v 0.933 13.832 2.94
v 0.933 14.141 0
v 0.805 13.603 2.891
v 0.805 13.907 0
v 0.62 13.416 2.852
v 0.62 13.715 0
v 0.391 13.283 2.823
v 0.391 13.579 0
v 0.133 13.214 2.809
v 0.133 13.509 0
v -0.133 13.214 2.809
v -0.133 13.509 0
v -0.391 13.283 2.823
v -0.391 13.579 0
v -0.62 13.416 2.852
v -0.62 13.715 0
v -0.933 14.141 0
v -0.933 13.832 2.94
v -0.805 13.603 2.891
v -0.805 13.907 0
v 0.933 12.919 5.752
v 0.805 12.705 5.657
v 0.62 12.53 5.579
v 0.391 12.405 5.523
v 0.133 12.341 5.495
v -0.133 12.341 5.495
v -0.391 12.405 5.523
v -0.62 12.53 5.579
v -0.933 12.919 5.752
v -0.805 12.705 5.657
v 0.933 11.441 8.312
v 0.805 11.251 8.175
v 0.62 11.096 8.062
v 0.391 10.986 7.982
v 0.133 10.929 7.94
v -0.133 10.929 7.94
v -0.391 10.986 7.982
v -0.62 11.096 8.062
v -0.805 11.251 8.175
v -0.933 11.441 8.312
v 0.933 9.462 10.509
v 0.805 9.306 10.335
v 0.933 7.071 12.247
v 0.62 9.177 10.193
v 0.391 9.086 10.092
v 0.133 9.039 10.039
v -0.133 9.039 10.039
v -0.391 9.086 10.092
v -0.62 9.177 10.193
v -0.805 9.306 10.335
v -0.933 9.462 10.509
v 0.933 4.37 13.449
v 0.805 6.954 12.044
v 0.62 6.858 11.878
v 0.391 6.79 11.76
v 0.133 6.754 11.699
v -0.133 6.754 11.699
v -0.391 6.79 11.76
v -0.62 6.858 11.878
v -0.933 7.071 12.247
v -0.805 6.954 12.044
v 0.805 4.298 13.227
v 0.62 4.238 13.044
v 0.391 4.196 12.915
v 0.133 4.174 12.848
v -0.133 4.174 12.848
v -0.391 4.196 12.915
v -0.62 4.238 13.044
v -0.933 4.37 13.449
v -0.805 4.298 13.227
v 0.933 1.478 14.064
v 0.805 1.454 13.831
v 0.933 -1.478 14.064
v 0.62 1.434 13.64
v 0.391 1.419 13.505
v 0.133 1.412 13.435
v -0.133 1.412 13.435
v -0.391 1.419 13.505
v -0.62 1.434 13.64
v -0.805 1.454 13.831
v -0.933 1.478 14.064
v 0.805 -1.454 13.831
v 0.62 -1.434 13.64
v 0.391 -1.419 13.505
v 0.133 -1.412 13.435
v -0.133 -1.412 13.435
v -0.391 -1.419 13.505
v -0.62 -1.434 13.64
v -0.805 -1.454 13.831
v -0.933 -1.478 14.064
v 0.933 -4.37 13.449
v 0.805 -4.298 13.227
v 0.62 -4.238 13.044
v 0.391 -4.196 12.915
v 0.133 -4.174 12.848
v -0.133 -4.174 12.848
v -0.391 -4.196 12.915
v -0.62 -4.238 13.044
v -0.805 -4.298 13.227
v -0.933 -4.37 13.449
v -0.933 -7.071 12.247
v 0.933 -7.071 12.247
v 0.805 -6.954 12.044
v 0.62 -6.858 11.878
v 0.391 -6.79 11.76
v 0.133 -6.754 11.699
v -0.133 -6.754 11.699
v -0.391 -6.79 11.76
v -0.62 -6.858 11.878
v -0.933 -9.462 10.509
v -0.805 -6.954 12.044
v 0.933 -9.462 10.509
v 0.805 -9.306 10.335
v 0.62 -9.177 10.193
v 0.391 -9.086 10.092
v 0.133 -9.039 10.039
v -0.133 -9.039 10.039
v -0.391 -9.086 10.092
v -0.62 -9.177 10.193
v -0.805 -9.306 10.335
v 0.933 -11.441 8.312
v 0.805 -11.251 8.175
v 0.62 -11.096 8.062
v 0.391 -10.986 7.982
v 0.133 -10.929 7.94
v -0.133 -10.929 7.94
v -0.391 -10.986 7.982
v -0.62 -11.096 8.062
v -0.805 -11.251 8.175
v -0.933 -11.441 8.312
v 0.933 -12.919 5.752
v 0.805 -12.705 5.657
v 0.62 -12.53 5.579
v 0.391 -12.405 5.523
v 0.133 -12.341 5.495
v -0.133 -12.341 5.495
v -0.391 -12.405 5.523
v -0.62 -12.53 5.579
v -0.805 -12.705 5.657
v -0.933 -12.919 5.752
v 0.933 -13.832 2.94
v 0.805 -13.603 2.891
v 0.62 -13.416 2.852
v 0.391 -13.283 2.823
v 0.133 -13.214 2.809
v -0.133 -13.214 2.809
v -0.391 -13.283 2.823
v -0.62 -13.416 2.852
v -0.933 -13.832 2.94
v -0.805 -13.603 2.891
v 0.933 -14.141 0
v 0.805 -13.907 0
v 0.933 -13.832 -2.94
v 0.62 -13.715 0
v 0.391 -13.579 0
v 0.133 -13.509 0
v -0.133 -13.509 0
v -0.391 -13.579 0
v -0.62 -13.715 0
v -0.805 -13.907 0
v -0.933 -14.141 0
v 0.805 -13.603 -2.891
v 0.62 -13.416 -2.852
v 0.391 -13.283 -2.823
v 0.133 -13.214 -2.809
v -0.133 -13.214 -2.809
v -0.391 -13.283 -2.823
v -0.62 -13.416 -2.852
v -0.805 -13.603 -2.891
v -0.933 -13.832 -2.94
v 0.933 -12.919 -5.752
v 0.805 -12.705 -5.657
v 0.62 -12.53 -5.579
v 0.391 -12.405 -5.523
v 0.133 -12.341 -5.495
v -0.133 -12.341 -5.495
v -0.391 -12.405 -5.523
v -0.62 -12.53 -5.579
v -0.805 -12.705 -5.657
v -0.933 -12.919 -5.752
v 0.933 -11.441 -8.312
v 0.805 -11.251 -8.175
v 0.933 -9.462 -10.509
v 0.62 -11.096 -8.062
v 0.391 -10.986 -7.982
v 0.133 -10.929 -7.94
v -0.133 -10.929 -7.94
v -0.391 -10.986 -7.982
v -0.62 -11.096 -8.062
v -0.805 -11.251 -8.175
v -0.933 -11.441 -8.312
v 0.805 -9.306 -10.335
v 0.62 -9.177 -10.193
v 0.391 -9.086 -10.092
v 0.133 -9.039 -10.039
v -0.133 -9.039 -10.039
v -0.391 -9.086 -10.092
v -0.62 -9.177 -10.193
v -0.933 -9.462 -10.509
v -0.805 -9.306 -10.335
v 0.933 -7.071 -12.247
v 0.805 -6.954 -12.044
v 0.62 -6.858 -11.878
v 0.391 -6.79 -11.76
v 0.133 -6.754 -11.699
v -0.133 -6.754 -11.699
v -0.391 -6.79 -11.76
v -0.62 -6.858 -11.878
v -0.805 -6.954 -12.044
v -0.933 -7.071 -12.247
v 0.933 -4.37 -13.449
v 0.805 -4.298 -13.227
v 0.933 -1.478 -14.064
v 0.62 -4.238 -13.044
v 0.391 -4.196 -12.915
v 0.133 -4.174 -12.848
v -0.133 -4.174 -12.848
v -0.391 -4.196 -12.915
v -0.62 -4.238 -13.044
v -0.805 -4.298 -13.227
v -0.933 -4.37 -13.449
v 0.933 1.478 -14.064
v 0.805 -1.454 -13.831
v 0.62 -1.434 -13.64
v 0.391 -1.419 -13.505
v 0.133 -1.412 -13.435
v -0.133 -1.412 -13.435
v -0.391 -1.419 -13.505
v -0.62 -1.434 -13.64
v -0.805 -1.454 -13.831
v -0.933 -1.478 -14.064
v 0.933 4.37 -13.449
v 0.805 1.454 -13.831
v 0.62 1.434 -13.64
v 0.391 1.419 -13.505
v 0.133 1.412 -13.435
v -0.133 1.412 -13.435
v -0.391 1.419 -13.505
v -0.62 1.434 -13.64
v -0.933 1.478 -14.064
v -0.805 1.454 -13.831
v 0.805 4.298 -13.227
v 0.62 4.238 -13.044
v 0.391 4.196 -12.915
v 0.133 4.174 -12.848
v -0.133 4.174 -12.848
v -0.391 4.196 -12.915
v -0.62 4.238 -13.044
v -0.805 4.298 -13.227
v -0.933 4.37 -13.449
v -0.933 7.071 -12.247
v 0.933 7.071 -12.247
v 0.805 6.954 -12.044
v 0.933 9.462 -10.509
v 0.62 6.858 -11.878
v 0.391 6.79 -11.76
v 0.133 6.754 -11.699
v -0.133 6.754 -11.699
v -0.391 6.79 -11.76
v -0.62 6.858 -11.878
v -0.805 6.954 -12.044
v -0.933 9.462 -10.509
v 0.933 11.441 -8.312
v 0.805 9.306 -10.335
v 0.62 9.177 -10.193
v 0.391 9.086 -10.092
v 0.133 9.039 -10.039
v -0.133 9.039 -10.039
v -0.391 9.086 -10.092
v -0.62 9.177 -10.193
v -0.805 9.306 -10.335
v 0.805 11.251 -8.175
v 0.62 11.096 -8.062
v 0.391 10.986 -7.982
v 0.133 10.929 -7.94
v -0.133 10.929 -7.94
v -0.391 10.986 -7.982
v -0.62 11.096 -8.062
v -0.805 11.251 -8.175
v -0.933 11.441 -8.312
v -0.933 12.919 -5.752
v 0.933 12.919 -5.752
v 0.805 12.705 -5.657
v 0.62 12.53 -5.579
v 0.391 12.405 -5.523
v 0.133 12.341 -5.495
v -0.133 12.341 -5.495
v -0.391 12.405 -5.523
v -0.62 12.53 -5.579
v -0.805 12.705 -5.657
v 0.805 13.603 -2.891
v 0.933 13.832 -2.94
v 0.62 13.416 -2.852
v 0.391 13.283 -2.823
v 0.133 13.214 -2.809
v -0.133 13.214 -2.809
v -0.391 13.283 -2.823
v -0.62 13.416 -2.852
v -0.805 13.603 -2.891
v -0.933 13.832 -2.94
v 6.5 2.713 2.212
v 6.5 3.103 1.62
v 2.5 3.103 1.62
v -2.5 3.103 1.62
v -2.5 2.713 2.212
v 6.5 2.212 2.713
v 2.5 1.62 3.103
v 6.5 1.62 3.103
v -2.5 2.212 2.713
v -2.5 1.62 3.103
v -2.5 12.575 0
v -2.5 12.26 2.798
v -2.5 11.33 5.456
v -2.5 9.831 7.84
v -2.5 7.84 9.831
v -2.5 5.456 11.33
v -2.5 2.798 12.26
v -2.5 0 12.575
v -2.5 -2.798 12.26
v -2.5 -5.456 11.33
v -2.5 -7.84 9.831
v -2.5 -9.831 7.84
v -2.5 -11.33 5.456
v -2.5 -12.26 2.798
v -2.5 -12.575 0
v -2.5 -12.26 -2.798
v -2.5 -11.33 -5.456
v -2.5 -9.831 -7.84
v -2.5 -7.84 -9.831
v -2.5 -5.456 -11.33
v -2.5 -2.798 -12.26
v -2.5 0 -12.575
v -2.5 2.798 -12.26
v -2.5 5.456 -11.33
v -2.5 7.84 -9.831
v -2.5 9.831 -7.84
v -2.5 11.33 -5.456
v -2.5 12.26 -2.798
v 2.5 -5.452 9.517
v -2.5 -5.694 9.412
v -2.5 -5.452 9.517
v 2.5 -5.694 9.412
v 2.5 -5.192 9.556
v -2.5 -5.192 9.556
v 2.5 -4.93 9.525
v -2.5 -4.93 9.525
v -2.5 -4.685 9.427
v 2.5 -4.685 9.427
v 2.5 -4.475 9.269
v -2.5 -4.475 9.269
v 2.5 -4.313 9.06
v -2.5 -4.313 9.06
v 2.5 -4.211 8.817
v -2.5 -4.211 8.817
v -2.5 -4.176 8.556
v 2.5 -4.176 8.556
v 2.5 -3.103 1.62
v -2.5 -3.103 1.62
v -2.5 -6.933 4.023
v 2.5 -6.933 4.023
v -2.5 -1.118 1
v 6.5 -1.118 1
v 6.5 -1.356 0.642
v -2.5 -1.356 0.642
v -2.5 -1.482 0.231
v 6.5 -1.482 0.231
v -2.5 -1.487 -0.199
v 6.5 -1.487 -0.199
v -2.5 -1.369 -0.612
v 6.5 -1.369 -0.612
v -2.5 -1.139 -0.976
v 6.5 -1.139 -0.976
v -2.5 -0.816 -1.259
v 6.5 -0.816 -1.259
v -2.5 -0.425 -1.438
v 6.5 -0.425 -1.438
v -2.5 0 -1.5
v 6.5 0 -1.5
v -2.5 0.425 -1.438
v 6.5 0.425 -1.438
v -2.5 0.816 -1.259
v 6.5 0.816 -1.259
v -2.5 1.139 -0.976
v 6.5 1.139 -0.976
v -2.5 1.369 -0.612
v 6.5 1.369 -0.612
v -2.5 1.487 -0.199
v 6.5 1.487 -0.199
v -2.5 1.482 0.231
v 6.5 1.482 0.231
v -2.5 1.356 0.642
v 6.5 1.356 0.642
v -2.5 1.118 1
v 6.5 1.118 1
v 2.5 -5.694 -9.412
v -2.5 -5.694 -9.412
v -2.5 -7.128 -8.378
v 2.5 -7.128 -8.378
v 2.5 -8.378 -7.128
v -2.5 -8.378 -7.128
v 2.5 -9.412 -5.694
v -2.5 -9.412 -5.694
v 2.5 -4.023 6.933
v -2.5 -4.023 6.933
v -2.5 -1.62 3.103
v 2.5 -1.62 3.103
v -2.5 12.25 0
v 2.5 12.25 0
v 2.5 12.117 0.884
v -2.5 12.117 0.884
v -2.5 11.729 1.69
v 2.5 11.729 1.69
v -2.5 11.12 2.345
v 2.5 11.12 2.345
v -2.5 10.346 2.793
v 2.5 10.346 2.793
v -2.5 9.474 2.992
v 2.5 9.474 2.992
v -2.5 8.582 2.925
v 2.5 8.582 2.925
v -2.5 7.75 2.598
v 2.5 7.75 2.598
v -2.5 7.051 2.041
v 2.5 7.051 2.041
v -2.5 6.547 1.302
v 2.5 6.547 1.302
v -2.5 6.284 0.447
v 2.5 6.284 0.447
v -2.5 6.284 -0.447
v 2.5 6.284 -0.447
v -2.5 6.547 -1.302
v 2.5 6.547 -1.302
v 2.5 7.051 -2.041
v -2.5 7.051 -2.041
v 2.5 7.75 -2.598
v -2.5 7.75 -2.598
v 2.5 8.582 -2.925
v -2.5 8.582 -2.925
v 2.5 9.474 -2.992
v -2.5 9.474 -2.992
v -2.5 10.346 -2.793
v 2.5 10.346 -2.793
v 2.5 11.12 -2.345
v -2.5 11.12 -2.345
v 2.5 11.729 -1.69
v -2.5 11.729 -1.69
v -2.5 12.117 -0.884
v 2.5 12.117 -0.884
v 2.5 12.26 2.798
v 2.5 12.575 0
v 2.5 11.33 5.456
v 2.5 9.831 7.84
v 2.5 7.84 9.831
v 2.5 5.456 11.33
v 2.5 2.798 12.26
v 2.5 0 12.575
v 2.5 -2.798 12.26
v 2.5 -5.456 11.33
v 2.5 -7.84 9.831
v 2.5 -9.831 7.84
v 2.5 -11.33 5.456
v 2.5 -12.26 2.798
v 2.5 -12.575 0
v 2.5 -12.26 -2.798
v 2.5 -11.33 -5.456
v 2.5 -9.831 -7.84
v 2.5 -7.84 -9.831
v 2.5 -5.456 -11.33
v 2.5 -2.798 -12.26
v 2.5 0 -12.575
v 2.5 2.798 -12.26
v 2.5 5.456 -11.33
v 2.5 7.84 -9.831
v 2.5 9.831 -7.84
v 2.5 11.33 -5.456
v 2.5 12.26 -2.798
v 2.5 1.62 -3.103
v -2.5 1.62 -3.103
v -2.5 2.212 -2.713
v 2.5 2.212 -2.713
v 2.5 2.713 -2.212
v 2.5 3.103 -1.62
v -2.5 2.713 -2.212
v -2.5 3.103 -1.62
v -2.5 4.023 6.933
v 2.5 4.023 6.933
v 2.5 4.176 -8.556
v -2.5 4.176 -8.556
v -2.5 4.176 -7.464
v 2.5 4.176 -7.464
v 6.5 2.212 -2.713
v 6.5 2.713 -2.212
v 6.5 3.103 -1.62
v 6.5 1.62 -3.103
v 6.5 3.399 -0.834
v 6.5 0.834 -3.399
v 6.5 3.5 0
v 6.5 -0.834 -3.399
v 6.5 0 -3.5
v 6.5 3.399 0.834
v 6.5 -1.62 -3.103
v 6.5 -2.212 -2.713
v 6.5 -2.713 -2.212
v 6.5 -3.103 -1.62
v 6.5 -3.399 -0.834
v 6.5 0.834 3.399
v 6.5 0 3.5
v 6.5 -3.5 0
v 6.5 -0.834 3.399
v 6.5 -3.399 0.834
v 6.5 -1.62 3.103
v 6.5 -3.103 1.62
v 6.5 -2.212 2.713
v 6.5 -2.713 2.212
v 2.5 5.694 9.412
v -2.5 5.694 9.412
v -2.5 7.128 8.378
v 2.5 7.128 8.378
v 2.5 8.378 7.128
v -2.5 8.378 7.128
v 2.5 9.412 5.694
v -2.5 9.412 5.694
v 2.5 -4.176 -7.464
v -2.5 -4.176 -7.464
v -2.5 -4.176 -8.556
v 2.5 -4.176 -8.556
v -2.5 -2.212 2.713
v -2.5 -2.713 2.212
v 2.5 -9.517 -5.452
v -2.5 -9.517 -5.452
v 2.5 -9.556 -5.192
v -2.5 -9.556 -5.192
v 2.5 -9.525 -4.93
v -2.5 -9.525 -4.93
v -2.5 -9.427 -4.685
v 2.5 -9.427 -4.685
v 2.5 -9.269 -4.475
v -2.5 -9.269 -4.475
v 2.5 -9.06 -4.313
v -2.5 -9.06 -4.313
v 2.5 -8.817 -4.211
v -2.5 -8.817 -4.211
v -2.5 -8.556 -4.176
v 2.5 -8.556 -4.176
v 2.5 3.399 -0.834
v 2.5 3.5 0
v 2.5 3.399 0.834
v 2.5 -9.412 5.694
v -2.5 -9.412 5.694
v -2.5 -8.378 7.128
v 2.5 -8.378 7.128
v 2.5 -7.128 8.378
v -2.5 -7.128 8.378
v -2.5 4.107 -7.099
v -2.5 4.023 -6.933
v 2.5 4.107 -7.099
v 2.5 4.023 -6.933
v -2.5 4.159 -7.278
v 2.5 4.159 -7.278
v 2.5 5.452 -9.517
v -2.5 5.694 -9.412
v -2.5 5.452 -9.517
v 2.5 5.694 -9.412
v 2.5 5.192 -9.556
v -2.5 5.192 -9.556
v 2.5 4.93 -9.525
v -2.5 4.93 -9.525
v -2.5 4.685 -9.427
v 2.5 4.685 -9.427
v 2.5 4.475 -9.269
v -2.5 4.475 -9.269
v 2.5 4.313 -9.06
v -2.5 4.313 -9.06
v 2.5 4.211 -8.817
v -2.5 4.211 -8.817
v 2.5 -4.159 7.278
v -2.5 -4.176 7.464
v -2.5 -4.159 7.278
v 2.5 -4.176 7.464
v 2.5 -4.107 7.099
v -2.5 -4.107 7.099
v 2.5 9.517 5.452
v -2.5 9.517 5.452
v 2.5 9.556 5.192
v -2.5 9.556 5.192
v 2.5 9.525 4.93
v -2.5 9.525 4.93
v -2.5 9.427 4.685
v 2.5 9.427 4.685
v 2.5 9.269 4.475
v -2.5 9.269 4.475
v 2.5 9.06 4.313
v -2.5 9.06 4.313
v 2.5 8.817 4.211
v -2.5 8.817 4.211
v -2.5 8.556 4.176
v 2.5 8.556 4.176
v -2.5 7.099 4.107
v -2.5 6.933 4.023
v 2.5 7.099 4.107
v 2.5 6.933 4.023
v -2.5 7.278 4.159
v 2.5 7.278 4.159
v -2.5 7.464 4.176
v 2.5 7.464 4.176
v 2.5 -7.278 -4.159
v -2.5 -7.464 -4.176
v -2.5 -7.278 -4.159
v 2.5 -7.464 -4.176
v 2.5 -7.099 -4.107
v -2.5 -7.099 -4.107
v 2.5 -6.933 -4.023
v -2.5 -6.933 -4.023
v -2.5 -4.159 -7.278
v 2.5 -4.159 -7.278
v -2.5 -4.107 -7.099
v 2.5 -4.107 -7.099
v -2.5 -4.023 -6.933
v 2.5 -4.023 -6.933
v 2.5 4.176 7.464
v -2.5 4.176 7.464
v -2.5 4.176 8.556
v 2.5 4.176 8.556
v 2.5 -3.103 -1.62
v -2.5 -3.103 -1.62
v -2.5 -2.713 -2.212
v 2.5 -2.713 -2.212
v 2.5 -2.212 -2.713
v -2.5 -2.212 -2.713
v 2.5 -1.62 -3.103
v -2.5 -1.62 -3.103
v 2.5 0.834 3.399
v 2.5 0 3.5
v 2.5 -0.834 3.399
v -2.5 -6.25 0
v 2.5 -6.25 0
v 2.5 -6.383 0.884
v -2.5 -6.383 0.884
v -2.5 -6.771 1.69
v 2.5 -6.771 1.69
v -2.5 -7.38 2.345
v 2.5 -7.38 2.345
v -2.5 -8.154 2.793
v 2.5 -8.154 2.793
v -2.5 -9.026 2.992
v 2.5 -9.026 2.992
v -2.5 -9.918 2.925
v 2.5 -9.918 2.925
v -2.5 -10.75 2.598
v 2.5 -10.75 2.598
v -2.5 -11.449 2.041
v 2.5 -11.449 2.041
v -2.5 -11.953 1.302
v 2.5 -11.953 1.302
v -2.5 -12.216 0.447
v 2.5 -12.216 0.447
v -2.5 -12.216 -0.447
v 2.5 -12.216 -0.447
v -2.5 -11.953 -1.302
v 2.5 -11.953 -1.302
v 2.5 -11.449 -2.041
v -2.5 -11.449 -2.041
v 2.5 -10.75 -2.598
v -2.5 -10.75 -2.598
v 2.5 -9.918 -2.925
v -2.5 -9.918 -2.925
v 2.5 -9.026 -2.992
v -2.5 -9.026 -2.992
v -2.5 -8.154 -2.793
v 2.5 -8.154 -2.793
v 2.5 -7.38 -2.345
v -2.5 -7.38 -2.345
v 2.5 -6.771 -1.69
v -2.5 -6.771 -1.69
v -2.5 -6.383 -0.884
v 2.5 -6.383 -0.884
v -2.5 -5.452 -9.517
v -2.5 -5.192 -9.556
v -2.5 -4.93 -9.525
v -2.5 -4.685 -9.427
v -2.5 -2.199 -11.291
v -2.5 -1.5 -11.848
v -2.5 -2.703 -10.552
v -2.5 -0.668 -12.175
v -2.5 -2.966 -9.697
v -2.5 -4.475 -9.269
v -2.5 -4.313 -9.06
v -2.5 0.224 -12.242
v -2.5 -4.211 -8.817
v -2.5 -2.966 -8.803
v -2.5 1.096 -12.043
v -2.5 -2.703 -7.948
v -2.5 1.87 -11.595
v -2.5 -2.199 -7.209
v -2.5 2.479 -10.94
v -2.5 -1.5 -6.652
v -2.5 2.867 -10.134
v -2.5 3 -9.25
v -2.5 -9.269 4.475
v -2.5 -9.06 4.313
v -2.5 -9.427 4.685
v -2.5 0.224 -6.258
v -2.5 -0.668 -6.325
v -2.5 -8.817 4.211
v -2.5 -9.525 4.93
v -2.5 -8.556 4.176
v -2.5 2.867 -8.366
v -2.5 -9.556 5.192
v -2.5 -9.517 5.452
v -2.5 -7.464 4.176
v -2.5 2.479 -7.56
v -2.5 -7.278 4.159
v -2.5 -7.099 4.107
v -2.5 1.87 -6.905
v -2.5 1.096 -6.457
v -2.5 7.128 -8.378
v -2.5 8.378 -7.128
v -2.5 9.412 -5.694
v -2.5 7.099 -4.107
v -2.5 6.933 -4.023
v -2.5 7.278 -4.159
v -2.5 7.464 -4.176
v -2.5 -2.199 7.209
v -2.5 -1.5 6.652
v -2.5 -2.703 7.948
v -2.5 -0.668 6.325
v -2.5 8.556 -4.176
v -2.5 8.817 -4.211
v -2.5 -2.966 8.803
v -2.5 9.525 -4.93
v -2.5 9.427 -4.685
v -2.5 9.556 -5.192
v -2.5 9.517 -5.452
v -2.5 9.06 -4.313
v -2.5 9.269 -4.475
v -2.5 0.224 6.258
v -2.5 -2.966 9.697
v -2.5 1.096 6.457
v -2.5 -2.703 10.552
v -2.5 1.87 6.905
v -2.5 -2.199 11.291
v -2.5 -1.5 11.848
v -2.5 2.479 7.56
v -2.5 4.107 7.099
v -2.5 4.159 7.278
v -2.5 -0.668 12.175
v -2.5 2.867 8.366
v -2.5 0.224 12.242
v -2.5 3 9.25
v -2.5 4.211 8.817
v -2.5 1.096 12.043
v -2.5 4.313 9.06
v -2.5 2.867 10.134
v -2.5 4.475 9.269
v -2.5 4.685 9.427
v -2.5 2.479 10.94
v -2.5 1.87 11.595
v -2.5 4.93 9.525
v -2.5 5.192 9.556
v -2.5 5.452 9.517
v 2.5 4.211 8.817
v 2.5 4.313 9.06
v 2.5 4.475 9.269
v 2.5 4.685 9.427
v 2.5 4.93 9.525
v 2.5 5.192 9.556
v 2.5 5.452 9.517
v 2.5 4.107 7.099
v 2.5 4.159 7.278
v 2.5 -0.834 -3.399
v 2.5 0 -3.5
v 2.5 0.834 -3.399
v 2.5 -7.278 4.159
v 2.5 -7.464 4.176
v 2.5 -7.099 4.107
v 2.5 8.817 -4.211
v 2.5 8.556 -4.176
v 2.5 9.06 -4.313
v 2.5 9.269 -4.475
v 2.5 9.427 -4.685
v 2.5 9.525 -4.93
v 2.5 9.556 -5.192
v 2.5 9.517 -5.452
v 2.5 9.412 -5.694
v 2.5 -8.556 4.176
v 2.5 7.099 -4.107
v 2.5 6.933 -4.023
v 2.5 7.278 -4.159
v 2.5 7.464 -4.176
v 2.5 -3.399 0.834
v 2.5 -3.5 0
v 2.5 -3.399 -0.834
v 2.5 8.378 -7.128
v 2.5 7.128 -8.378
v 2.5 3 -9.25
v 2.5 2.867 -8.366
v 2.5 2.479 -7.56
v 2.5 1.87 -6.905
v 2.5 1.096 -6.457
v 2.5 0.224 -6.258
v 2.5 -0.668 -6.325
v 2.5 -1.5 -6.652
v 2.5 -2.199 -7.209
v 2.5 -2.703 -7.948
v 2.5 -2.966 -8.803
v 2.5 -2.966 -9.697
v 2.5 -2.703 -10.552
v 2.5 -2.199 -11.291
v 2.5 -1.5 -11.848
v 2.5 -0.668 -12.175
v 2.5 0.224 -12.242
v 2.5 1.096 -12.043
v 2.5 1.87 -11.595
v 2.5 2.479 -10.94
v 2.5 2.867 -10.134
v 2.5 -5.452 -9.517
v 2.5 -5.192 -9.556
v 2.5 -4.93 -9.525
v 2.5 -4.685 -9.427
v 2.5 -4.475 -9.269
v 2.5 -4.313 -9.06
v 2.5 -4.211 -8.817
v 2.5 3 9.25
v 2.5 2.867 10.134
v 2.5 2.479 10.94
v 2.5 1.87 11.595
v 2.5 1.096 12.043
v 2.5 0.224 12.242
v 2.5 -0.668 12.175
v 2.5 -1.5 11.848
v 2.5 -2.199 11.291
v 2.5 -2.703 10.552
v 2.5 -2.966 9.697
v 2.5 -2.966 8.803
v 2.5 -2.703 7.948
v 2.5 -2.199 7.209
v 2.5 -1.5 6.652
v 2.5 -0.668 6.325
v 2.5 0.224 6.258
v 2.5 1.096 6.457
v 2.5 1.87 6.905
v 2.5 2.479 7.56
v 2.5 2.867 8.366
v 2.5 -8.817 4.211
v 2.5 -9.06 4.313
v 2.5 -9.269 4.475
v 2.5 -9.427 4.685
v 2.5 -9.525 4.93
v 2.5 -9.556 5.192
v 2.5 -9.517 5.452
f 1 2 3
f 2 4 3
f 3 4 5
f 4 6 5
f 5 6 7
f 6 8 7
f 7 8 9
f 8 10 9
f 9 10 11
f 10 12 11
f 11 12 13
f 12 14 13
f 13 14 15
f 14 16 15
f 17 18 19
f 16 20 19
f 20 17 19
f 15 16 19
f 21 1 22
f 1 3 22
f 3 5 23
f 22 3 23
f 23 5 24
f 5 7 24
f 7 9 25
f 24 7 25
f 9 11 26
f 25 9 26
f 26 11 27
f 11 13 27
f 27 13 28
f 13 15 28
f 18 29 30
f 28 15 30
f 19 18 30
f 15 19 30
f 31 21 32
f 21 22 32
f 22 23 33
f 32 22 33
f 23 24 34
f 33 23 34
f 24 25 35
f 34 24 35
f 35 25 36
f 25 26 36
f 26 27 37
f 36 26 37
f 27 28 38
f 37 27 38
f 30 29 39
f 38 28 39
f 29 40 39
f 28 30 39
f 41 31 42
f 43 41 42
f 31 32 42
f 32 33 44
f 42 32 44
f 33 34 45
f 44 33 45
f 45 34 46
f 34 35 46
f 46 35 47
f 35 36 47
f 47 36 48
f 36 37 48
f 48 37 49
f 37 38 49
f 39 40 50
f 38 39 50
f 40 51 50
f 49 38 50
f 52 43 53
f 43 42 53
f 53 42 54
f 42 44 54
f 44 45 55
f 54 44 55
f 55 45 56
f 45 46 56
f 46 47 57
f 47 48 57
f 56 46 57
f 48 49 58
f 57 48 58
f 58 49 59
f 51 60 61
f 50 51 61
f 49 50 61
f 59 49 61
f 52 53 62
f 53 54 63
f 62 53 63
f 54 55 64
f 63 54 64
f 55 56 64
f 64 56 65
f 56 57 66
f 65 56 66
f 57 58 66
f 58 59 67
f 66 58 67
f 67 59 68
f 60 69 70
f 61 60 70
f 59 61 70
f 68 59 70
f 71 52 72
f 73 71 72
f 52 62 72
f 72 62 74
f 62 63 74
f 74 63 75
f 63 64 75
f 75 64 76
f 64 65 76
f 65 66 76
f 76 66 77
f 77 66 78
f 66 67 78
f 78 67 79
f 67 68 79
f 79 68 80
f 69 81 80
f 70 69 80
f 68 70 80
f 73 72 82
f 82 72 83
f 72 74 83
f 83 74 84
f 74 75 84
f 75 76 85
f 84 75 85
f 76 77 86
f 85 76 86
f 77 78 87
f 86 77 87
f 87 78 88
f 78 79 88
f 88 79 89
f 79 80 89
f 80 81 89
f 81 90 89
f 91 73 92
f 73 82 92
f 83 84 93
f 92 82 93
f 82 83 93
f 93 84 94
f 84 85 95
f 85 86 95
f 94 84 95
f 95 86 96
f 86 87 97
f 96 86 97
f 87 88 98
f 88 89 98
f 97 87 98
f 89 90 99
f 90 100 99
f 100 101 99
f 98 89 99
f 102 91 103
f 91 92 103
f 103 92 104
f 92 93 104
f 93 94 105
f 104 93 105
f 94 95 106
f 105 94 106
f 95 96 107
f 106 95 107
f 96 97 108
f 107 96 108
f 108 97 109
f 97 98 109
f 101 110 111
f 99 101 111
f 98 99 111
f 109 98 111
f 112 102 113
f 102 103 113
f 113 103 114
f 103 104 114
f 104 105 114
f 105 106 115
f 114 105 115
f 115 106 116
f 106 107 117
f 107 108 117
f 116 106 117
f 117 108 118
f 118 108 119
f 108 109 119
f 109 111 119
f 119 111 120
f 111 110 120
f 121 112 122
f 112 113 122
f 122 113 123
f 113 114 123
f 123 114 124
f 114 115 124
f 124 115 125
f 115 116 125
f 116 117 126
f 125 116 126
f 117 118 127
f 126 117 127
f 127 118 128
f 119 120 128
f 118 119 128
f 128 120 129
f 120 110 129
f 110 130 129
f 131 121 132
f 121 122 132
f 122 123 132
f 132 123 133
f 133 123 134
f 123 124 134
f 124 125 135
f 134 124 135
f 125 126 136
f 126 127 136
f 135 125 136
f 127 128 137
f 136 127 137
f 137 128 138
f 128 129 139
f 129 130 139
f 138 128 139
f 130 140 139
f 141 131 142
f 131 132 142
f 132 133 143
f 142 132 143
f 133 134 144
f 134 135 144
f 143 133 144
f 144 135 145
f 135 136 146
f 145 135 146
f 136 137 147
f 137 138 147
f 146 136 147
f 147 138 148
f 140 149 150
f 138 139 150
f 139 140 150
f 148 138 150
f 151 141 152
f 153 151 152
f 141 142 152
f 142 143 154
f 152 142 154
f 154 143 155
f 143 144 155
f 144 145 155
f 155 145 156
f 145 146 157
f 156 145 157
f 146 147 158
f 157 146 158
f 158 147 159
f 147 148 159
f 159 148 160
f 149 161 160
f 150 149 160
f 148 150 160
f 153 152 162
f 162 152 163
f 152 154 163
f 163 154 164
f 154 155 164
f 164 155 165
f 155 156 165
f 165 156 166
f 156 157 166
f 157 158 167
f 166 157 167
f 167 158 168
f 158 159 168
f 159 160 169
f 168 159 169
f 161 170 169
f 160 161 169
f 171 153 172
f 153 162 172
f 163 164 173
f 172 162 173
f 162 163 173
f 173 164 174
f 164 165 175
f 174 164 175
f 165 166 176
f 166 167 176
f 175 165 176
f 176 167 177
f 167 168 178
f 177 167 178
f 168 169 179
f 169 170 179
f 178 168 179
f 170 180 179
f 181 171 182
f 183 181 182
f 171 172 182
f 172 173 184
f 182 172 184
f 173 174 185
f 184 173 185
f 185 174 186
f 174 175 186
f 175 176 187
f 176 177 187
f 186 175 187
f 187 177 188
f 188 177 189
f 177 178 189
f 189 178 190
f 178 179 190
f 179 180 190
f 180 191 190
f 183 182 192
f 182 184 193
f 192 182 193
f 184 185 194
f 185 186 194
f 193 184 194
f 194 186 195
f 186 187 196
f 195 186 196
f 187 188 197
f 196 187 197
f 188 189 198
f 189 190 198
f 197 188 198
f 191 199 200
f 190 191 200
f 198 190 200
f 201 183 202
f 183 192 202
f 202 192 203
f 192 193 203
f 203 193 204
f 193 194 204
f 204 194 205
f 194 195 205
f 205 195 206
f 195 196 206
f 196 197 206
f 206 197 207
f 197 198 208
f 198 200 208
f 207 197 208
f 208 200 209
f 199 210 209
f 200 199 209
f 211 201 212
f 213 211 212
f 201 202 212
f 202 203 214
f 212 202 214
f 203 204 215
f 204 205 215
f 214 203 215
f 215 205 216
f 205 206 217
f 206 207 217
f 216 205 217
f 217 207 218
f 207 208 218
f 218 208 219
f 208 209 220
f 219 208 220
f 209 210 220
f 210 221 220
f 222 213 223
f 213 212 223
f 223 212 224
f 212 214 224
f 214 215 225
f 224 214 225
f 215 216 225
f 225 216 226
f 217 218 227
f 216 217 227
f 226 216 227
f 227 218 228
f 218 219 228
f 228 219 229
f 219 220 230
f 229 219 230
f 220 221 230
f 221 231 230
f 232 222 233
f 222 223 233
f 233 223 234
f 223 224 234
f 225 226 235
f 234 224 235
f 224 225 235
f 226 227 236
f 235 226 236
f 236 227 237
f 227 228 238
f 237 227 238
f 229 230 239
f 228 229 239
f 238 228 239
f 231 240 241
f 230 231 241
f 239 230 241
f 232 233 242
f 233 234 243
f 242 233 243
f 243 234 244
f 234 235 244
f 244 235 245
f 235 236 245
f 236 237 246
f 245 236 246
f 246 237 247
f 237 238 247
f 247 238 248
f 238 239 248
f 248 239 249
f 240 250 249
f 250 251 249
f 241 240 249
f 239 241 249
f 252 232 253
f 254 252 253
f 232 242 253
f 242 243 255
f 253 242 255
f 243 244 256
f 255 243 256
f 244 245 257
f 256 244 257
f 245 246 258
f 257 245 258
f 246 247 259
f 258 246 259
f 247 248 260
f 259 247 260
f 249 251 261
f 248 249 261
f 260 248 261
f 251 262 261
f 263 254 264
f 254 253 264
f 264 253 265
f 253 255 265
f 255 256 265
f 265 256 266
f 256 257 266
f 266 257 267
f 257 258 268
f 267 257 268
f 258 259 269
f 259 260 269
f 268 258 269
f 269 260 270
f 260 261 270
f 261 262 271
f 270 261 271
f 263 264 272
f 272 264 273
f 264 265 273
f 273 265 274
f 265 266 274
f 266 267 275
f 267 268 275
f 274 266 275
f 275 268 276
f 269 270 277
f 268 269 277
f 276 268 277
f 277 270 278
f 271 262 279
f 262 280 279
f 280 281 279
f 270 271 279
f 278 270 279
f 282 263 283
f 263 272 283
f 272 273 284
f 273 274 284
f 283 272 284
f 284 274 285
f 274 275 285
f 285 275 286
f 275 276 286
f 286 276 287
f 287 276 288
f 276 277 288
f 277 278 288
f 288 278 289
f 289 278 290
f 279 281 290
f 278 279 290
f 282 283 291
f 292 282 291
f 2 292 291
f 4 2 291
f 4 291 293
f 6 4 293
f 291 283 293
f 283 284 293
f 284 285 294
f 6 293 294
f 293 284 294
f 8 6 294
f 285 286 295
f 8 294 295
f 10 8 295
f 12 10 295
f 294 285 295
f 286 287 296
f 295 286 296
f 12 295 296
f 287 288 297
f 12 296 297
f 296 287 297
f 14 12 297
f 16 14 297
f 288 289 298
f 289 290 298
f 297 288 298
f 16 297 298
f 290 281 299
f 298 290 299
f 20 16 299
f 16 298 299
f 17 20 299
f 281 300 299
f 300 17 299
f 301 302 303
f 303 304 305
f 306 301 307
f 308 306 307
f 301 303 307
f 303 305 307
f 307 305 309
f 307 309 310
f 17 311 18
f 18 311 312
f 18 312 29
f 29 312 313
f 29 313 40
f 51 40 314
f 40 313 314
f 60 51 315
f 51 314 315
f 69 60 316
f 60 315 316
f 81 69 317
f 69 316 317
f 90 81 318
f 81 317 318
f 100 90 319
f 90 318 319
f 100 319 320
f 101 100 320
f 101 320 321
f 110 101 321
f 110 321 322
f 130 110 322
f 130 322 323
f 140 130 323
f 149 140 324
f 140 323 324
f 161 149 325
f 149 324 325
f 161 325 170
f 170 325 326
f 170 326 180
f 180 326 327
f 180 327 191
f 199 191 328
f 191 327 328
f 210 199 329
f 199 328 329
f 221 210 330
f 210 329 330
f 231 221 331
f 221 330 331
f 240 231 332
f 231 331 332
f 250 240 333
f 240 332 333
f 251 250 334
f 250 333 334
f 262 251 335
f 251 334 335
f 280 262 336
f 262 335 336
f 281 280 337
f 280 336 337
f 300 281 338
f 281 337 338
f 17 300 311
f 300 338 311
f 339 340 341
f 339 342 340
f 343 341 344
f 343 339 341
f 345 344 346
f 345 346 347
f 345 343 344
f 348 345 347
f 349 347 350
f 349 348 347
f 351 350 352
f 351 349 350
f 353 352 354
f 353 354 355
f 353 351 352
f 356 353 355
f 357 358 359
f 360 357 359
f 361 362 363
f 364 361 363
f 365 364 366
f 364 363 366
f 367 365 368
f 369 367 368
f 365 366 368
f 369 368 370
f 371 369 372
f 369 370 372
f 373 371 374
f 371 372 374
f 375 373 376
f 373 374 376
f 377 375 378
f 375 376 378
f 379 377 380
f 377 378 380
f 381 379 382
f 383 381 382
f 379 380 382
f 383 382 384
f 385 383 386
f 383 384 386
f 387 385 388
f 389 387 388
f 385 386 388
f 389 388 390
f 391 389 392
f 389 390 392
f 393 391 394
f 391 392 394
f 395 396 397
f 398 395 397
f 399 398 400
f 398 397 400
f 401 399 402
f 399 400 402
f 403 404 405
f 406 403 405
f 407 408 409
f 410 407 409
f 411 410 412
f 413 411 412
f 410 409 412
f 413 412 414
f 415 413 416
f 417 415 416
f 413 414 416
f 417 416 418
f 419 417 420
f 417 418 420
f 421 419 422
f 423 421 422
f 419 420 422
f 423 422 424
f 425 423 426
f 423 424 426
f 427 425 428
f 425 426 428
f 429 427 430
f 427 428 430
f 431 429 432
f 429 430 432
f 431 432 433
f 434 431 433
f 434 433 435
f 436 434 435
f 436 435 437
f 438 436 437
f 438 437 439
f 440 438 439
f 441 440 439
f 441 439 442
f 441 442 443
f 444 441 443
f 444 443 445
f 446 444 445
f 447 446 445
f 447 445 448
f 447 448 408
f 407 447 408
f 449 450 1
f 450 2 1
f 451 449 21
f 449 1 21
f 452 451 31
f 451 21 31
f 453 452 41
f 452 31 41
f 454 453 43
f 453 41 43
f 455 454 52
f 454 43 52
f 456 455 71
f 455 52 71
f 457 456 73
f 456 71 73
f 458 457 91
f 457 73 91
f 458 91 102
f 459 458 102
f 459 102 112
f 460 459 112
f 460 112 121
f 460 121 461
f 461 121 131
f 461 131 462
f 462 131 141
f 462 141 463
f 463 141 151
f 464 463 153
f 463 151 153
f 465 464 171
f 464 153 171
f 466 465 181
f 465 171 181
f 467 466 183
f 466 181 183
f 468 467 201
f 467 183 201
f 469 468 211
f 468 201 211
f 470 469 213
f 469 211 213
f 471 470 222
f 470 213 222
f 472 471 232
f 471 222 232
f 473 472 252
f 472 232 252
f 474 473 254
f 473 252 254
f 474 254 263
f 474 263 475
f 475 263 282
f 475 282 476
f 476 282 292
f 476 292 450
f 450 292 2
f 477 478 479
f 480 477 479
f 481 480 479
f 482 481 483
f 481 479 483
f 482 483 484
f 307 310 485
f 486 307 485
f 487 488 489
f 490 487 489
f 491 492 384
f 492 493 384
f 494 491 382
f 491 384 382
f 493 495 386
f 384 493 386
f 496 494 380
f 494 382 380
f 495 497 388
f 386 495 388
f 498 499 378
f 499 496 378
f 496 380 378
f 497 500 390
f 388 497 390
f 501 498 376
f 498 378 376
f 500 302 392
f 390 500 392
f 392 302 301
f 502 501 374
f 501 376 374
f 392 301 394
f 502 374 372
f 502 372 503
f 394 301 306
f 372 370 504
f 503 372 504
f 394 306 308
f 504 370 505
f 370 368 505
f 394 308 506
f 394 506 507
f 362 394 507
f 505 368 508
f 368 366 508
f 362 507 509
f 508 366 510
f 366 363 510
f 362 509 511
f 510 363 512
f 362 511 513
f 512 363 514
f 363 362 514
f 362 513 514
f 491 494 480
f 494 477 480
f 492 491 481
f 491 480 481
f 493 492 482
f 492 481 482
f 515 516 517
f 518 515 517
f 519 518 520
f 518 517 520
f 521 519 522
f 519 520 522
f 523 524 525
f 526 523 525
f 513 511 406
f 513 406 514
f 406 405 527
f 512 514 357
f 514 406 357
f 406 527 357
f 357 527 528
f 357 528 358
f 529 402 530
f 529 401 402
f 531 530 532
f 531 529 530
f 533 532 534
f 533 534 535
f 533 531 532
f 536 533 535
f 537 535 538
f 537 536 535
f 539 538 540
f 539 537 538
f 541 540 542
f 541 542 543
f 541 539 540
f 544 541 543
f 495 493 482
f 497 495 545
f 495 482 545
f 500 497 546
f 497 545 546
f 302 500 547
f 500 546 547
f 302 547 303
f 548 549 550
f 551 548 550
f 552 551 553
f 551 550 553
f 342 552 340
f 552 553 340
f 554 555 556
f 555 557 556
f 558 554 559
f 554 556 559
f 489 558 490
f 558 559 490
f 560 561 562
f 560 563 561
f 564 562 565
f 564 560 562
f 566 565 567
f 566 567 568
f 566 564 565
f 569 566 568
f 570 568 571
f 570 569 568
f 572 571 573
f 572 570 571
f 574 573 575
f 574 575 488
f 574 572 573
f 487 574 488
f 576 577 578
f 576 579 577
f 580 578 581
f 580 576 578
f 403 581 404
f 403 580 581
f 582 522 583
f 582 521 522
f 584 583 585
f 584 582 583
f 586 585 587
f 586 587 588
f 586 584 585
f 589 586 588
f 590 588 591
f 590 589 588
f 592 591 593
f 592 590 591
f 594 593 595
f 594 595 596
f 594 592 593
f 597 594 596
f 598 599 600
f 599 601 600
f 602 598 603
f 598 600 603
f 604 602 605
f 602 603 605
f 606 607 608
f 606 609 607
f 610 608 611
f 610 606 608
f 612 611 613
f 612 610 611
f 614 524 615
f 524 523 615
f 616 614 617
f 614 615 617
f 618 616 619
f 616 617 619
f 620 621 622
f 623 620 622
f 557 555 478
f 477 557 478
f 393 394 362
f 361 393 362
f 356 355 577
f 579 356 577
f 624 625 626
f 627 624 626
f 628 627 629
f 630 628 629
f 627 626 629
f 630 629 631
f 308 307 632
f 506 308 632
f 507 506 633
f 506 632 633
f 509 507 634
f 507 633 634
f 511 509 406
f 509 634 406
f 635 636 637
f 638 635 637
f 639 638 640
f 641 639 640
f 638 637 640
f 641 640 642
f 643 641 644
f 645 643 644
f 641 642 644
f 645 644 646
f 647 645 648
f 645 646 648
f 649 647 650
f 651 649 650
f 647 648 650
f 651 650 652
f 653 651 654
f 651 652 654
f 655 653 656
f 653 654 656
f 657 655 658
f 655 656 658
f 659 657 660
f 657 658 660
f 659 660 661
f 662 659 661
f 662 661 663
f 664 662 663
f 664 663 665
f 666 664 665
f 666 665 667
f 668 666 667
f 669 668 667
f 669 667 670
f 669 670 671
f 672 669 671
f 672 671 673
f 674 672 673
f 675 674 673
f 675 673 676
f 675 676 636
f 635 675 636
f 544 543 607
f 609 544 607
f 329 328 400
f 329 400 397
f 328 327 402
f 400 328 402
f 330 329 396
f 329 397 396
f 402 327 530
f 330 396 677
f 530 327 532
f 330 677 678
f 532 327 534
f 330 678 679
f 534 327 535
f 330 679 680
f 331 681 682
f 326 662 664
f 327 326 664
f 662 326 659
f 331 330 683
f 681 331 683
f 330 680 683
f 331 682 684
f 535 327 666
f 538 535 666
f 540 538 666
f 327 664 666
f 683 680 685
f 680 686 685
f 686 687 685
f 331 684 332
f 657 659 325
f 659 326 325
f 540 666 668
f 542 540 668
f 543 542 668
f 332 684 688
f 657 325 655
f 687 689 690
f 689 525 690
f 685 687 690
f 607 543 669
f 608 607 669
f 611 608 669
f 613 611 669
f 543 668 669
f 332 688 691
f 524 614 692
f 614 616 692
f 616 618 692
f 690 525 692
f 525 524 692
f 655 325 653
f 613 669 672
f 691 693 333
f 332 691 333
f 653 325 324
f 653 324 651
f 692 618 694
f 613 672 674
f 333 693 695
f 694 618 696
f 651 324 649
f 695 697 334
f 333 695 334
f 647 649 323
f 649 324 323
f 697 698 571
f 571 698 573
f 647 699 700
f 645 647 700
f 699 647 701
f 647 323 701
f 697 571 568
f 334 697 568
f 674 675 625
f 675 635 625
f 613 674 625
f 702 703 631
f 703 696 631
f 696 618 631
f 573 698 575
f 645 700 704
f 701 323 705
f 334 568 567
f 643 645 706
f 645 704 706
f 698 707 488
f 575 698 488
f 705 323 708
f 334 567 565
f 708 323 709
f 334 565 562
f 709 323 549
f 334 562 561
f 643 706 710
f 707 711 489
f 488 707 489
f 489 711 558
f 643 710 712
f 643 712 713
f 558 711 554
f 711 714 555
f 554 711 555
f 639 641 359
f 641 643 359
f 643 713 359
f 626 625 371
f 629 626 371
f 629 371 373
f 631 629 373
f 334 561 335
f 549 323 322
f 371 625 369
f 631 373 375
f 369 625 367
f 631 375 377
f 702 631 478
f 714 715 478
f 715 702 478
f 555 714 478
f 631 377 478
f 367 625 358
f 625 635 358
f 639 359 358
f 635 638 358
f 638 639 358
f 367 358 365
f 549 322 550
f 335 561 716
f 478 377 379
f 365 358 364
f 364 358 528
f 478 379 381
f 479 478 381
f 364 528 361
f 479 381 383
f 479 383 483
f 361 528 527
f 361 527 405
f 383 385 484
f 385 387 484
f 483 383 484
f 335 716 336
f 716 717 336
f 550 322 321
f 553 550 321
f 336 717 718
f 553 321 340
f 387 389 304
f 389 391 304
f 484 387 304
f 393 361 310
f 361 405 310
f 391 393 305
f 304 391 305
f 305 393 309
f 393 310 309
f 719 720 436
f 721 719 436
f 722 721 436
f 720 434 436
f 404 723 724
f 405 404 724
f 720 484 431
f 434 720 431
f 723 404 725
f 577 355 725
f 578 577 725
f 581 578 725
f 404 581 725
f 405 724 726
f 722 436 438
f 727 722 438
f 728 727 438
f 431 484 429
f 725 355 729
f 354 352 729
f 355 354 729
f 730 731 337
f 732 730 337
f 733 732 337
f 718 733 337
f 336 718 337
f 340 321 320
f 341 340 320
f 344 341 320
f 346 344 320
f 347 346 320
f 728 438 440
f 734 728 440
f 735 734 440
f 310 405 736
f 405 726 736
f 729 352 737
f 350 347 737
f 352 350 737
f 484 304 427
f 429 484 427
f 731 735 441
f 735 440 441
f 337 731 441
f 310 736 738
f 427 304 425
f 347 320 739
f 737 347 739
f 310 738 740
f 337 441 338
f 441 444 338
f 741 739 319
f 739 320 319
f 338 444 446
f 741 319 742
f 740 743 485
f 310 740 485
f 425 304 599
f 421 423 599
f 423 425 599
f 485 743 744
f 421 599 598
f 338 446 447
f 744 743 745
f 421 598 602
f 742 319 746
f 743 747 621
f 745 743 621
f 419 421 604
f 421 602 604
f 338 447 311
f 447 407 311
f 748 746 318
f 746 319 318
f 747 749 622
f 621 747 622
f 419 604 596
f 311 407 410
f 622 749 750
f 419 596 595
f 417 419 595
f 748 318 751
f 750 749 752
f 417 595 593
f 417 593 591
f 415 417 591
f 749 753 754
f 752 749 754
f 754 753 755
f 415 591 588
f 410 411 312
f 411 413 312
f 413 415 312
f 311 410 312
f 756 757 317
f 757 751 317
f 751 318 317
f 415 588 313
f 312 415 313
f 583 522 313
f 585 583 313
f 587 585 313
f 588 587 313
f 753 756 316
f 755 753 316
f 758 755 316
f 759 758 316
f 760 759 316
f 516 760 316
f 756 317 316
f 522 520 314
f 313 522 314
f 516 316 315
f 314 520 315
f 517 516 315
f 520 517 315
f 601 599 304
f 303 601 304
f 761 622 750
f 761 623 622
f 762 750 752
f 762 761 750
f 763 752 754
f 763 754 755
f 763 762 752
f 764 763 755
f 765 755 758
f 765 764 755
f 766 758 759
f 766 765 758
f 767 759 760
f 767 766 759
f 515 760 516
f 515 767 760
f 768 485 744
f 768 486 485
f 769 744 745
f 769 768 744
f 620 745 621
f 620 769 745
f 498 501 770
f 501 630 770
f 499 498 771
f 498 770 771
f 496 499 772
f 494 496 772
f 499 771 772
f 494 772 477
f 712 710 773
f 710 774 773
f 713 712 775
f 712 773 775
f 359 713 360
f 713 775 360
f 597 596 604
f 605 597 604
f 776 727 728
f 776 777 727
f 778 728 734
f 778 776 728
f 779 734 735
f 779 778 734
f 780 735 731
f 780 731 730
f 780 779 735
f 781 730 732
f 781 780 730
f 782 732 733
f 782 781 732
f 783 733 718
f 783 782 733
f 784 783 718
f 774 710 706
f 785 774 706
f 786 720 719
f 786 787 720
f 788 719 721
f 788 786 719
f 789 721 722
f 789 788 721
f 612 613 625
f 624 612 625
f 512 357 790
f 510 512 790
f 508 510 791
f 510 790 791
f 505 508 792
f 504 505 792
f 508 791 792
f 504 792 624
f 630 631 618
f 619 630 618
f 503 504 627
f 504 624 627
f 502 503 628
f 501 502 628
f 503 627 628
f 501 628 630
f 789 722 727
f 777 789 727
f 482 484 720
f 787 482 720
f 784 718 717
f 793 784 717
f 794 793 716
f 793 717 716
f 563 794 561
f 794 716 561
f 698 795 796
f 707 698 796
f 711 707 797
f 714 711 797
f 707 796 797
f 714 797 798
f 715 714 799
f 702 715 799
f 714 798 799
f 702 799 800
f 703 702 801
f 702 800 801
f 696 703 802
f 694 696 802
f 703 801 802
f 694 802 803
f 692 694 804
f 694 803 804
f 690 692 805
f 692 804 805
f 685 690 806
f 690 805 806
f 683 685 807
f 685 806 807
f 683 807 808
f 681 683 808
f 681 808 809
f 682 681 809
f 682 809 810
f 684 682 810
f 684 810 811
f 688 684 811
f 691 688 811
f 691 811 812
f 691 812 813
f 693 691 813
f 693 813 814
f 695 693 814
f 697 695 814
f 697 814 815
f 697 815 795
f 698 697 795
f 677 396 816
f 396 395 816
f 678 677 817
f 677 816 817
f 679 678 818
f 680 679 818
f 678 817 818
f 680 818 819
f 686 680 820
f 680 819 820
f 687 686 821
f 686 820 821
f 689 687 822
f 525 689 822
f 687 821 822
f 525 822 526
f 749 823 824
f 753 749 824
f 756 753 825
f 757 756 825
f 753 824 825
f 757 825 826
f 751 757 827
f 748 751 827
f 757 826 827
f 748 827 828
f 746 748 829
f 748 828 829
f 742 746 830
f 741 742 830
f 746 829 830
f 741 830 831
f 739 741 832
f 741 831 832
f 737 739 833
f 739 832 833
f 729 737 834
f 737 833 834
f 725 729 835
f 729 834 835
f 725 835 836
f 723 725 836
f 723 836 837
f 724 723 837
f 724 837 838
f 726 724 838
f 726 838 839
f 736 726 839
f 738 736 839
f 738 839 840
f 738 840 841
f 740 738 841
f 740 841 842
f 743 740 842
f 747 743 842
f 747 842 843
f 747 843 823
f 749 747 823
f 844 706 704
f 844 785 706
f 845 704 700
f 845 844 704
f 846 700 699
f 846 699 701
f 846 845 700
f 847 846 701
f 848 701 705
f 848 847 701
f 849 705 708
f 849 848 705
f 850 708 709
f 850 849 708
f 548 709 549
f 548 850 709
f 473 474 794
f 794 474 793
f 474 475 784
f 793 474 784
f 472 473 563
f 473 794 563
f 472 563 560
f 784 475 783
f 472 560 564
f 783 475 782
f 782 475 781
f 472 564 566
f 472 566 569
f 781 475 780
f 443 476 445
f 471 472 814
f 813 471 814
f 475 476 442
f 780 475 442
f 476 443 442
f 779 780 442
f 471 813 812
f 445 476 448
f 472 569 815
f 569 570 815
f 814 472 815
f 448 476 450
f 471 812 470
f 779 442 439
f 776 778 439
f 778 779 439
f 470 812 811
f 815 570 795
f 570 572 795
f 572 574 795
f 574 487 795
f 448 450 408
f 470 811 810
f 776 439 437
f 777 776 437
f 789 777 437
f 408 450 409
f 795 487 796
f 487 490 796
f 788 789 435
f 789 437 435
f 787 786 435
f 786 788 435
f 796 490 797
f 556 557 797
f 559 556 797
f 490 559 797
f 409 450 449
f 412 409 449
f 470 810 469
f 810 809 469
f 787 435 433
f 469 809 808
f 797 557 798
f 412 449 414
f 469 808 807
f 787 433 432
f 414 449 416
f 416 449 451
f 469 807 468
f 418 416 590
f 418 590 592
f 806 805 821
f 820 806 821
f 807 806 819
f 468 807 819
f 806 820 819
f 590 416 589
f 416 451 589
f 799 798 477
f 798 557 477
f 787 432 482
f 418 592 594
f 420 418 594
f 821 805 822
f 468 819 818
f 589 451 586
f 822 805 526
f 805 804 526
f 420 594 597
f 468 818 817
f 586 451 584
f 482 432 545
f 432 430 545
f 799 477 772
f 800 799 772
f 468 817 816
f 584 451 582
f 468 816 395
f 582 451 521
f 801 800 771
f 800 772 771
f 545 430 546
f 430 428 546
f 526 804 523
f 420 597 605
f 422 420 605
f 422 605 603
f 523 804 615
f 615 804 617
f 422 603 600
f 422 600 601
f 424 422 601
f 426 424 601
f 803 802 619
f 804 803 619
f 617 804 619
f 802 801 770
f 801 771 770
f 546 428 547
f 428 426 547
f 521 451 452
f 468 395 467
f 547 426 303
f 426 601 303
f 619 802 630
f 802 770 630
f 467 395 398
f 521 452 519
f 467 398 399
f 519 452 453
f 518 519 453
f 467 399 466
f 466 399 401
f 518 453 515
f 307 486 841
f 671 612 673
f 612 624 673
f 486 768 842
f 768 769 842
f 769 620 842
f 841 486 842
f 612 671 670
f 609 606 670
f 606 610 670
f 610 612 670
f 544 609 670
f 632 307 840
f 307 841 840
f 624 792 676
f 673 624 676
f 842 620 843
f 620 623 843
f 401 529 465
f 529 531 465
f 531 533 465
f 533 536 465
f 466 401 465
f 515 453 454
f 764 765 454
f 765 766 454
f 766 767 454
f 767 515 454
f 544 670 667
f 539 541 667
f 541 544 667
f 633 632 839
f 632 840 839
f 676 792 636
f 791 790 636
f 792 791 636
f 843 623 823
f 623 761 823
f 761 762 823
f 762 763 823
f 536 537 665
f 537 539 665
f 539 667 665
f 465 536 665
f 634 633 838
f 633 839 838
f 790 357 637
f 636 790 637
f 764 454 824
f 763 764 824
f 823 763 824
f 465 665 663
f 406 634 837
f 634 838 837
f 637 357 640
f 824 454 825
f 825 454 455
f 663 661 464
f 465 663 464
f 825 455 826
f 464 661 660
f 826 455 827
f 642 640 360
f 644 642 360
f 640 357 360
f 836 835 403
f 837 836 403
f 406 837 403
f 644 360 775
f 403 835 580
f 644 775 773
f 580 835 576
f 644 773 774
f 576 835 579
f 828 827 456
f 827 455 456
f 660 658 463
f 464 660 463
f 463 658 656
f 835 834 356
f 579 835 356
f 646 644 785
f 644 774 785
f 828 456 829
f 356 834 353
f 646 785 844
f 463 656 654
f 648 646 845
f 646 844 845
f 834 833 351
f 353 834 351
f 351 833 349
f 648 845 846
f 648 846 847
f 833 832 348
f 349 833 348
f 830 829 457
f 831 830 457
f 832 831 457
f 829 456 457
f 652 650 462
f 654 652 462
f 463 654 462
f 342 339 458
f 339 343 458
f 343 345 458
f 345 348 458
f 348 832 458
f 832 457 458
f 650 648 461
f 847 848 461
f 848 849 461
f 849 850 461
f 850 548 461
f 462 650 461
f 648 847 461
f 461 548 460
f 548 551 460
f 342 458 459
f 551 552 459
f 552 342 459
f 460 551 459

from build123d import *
from build123d import SkipClean  # not in build123d's __all__

# Parameters (mm, degrees)
F3_DEPTH = 25
F5_DEPTH = 25
F6_R     = 1
F7_R     = 3
F8_DEPTH = 25


with BuildPart() as f1:
    # F0 (on Top) → F1 (revolve)
    with BuildSketch(Plane.XY):
        with BuildLine():
            Line((-2.5, 12.5748384835), (-2.5, 0))
            Line((-2.5, 0), (6.5, 0))
            Line((6.5, 0), (6.5, 3.5))
            Line((6.5, 3.5), (2.5, 3.5))
            Line((2.5, 3.5), (2.5, 12.5748384835))
            Line((2.5, 12.5748384835), (0.9334766536, 14.1413618298))
            ThreePointArc((0.9334766536, 14.1413618298), (0, 13.5), (-0.9334766536, 14.1413618298))
            Line((-0.9334766536, 14.1413618298), (-2.5, 12.5748384835))
        make_face()
    revolve(axis=Axis((2, 0, 0), (1, 0, 0)))

    # F2 (on face) → F3 (cut)
    with BuildSketch(Plane(origin=(-2.5, 0, 0), x_dir=(0, -1, 0), z_dir=(-1, 0, 0))):
        with BuildLine():
            Line((-4.1763500472, 7.1763500472), (-4.1763500472, 10.1763500472))
            ThreePointArc((-4.1763500472, 10.1763500472), (-7.7781745931, 7.7781745931), (-10.1763500472, 4.1763500472))
            Line((-10.1763500472, 4.1763500472), (-7.1763500472, 4.1763500472))
            Line((-7.1763500472, 4.1763500472), (-3.1025807736, 1.6198742369))
            ThreePointArc((-3.1025807736, 1.6198742369), (-2.4748737342, 2.4748737342), (-1.6198742369, 3.1025807736))
            Line((-1.6198742369, 3.1025807736), (-4.1763500472, 7.1763500472))
        make_face()
        with BuildLine():
            ThreePointArc((10.1763500472, 4.1763500472), (7.7781745931, 7.7781745931), (4.1763500472, 10.1763500472))
            Line((4.1763500472, 10.1763500472), (4.1763500472, 7.1763500472))
            Line((4.1763500472, 7.1763500472), (1.6198742369, 3.1025807736))
            ThreePointArc((1.6198742369, 3.1025807736), (2.4748737342, 2.4748737342), (3.1025807736, 1.6198742369))
            Line((3.1025807736, 1.6198742369), (7.1763500472, 4.1763500472))
            Line((7.1763500472, 4.1763500472), (10.1763500472, 4.1763500472))
        make_face()
        with BuildLine():
            Line((-7.1763500472, -4.1763500472), (-10.1763500472, -4.1763500472))
            ThreePointArc((-10.1763500472, -4.1763500472), (-7.7781745931, -7.7781745931), (-4.1763500472, -10.1763500472))
            Line((-4.1763500472, -10.1763500472), (-4.1763500472, -7.1763500472))
            Line((-4.1763500472, -7.1763500472), (-1.6198742369, -3.1025807736))
            ThreePointArc((-1.6198742369, -3.1025807736), (-2.4748737342, -2.4748737342), (-3.1025807736, -1.6198742369))
            Line((-3.1025807736, -1.6198742369), (-7.1763500472, -4.1763500472))
        make_face()
        with BuildLine():
            Line((10.1763500472, -4.1763500472), (7.1763500472, -4.1763500472))
            Line((7.1763500472, -4.1763500472), (3.1025807736, -1.6198742369))
            ThreePointArc((3.1025807736, -1.6198742369), (2.4748737342, -2.4748737342), (1.6198742369, -3.1025807736))
            Line((1.6198742369, -3.1025807736), (4.1763500472, -7.1763500472))
            Line((4.1763500472, -7.1763500472), (4.1763500472, -10.1763500472))
            ThreePointArc((4.1763500472, -10.1763500472), (7.7781745931, -7.7781745931), (10.1763500472, -4.1763500472))
        make_face()
    with SkipClean():  # cleaning this boolean's faces spoils the solid; the shape is the same uncleaned
        extrude(amount=-F3_DEPTH, mode=Mode.SUBTRACT)

    # F4 (on face) → F5 (cut)
    with BuildSketch(Plane.YZ.offset(6.5)):
        with BuildLine():
            Line((1.1180339887, 1), (-1.1180339887, 1))
            ThreePointArc((-1.1180339887, 1), (0, -1.5), (1.1180339887, 1))
        make_face()
    with SkipClean():  # cleaning this boolean's faces spoils the solid; the shape is the same uncleaned
        extrude(amount=-F5_DEPTH, mode=Mode.SUBTRACT)

    # F6
    f6_edges = [f1.edges().sort_by_distance(p)[0] for p in [
        (0, -10.17635, 4.17635),
        (0, 4.17635, -10.17635),
        (0, -4.17635, -10.17635),
        (0, -10.17635, -4.17635),
        (0, 10.17635, -4.17635),
        (0, 10.17635, 4.17635),
        (0, 4.17635, 10.17635),
        (0, -4.17635, 10.17635),
        (0, -4.17635, -7.17635),
        (0, -7.17635, -4.17635),
        (0, 7.17635, -4.17635),
        (0, 4.17635, -7.17635),
        (0, -7.17635, 4.17635),
        (0, -4.17635, 7.17635),
        (0, 7.17635, 4.17635),
        (0, 4.17635, 7.17635),
    ]]
    fillet(f6_edges, radius=F6_R)

    # F7 (on face) → F8 (cut)
    with BuildSketch(Plane.YZ.offset(2.5)):
        with Locations((0, 9.25)):
            Circle(F7_R)
        with Locations((-9.25, 0)):
            Circle(F7_R)
        with Locations((9.25, 0)):
            Circle(F7_R)
        with Locations((0, -9.25)):
            Circle(F7_R)
    with SkipClean():  # cleaning this boolean's faces spoils the solid; the shape is the same uncleaned
        extrude(amount=-F8_DEPTH, mode=Mode.SUBTRACT)


solid = f1.part
